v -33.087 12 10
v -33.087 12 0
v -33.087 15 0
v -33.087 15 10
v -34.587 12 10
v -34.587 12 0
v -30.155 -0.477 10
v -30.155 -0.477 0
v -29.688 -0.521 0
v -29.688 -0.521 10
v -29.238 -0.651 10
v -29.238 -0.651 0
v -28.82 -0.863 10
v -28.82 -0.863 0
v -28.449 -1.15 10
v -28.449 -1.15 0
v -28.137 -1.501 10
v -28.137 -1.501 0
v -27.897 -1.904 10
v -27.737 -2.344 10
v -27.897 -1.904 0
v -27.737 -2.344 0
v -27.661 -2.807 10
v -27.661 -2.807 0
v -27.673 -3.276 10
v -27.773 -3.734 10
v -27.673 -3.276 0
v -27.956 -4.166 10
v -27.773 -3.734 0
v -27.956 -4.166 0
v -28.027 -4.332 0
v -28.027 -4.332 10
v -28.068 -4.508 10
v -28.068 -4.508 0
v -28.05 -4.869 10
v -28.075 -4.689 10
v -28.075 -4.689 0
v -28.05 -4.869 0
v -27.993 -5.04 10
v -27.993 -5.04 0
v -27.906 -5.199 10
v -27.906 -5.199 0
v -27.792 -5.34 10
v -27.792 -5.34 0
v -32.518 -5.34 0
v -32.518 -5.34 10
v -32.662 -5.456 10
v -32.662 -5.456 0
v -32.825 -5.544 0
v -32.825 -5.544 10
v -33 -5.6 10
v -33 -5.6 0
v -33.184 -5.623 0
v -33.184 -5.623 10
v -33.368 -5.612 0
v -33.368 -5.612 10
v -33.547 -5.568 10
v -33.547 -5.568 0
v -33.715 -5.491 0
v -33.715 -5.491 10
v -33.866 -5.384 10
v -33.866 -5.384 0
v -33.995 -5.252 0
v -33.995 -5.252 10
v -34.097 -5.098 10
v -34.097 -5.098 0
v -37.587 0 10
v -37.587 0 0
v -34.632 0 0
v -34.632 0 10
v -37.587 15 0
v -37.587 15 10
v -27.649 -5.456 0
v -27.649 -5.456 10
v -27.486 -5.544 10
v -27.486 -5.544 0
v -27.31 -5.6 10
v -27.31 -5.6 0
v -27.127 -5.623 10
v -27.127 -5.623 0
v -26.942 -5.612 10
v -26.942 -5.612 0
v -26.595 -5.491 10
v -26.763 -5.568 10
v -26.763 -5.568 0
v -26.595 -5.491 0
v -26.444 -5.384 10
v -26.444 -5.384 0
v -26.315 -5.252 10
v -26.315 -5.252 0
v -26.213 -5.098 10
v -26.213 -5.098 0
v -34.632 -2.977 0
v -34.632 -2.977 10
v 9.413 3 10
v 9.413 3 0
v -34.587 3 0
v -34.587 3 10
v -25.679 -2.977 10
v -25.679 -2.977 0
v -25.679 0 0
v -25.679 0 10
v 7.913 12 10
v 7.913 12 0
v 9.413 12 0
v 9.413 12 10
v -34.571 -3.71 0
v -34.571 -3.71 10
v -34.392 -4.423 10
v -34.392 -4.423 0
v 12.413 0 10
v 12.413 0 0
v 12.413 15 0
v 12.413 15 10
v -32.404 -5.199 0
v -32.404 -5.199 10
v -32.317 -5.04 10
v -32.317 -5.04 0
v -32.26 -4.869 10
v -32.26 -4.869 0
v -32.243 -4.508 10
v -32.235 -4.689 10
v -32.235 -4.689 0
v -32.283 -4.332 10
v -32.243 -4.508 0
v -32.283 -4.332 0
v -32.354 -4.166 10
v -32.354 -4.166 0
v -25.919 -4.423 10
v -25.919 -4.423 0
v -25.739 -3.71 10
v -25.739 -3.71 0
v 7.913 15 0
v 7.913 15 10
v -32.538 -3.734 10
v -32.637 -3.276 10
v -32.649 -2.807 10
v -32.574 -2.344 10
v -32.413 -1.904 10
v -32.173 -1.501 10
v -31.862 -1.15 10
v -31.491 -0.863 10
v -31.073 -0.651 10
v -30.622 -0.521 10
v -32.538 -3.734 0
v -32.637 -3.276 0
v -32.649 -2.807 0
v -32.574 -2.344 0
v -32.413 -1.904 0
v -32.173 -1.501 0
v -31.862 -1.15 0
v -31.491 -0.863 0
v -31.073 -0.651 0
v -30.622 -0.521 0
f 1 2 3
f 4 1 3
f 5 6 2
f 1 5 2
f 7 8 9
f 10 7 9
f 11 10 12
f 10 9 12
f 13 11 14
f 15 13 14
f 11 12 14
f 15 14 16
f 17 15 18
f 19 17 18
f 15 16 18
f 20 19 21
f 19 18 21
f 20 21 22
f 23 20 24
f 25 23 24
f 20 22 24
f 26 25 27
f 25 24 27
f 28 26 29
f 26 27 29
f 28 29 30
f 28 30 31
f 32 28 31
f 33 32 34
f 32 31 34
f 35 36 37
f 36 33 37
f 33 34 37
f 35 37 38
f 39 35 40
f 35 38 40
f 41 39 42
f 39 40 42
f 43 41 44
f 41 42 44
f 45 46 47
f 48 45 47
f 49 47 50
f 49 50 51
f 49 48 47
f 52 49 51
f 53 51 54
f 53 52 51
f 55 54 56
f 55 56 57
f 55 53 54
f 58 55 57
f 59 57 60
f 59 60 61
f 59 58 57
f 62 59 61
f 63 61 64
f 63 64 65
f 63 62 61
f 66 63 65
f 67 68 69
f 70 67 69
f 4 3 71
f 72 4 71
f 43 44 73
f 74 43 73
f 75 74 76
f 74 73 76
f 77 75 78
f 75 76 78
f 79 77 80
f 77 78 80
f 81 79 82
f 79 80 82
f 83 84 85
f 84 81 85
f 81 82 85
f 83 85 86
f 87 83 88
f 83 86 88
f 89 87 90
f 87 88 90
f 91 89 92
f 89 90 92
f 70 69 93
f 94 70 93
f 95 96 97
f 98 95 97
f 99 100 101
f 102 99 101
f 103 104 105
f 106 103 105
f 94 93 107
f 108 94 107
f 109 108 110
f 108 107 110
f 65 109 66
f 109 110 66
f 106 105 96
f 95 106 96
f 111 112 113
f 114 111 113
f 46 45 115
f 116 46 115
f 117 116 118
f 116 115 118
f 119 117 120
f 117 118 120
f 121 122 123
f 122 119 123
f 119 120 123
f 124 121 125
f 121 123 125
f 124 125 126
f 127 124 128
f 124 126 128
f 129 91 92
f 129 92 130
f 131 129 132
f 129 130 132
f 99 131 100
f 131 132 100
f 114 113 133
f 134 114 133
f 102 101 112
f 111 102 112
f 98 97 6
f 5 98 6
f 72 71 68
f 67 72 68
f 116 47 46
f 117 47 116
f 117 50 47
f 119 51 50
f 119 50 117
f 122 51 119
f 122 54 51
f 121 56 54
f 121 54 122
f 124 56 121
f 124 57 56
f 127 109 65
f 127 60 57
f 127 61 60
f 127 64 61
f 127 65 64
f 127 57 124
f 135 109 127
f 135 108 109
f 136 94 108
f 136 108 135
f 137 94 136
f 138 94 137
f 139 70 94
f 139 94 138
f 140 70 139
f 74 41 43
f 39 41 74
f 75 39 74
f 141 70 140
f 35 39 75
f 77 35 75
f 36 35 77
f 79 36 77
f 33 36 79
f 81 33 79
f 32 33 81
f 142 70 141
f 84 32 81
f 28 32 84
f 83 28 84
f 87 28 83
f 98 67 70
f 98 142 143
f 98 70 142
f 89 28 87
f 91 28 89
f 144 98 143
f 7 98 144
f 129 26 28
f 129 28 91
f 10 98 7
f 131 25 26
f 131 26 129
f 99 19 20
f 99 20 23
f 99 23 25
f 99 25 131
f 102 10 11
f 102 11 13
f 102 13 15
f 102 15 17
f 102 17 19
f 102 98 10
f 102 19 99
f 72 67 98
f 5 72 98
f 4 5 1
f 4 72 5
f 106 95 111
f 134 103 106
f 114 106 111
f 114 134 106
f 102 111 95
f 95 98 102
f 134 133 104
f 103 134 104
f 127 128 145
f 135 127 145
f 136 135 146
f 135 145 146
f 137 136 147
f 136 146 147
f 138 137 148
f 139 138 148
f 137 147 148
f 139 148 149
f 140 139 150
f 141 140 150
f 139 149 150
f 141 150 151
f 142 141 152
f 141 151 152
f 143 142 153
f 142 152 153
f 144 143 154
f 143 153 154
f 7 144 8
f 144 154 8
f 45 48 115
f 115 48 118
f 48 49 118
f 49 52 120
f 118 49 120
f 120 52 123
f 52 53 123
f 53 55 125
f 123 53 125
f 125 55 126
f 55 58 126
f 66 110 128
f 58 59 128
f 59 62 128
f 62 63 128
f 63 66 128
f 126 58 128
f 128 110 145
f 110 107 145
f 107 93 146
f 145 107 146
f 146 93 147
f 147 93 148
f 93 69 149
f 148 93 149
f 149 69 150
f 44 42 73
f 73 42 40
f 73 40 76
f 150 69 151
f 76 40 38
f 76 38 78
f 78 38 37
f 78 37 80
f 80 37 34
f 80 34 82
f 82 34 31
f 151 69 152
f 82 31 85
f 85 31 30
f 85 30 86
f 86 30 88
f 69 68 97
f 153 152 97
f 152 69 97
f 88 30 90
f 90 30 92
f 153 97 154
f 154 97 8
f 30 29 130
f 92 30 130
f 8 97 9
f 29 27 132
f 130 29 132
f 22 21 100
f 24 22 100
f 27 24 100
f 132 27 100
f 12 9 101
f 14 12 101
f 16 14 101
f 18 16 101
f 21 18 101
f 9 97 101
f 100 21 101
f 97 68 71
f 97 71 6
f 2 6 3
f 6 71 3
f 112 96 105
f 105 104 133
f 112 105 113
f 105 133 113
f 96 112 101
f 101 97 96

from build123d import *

# Parameters (mm, degrees)
F1_DEPTH    = 10
F2_T1_DEPTH = 16.5073043021
F2_T3_DEPTH = 14.2705098312


# Not quite as in the source:
# - a fillet or chamfer that OpenCascade refuses, or shapes differently, is made with other operations: its cross-section is extruded or revolved along the edge and cut away or added


with BuildPart() as f1:
    # F0 (on Top) → F1 (new body)
    with BuildSketch(Plane.XY):
        with BuildLine():
            Line((-25.6786430255, 0), (12.4131741374, 0))
            Line((12.4131741374, 0), (12.4131741374, 15))
            Line((12.4131741374, 15), (7.9131741374, 15))
            Line((7.9131741374, 15), (7.9131741374, 12))
            Line((7.9131741374, 12), (9.4131741374, 12))
            Line((9.4131741374, 12), (9.4131741374, 3))
            Line((9.4131741374, 3), (-34.5868258626, 3))
            Line((-34.5868258626, 3), (-34.5868258626, 12))
            Line((-34.5868258626, 12), (-33.0868258626, 12))
            Line((-33.0868258626, 12), (-33.0868258626, 15))
            Line((-33.0868258626, 15), (-37.5868258626, 15))
            Line((-37.5868258626, 15), (-37.5868258626, 0))
            Line((-37.5868258626, 0), (-34.6318436787, 0))
            Line((-34.6318436787, 0), (-34.6318436787, -2.9766003136))
            ThreePointArc((-34.6318436787, -2.9766003136), (-34.291082769, -4.6897210919), (-33.3206777997, -6.1420347612))
            Line((-33.3206777997, -6.1420347612), (-31.923010305, -4.7443672665))
            ThreePointArc((-31.923010305, -4.7443672665), (-32.4649421833, -2.0198917326), (-30.1552433521, -0.4766003136))
            ThreePointArc((-30.1552433521, -0.4766003136), (-27.8455445208, -2.0198917326), (-28.3874763991, -4.7443672665))
            Line((-28.3874763991, -4.7443672665), (-26.9898089045, -6.1420347612))
            ThreePointArc((-26.9898089045, -6.1420347612), (-26.0194039351, -4.6897210919), (-25.6786430255, -2.9766003136))
            Line((-25.6786430255, -2.9766003136), (-25.6786430255, 0))
        make_face()
    extrude(amount=F1_DEPTH)

    # F2: fillet of radius 1 on 4 edges, made by hand

    # F2_s2 → F2_t1 (cut)
    with BuildSketch(Plane.XY.offset(-3.253652151)):
        with BuildLine():
            ThreePointArc((-32.5096806342, -5.3310375957), (-33.3621500528, -5.6133092576), (-34.0974017442, -5.0977645446))
            ThreePointArc((-34.0974017442, -5.0977645446), (-33.7471918574, -5.6482770191), (-33.3206777997, -6.1420347612))
            Line((-33.3206777997, -6.1420347612), (-32.5096806342, -5.3310375957))
        make_face()
        with BuildLine():
            ThreePointArc((-27.8008060699, -5.3310375957), (-26.9483366513, -5.6133092576), (-26.2130849599, -5.0977645446))
            ThreePointArc((-26.2130849599, -5.0977645446), (-26.5632948467, -5.6482770191), (-26.9898089045, -6.1420347612))
            Line((-26.9898089045, -6.1420347612), (-27.8008060699, -5.3310375957))
        make_face()
    extrude(amount=F2_T1_DEPTH, mode=Mode.SUBTRACT)

    # F2_s4 → F2_t3 (cut)
    with BuildSketch(Plane.XY.offset(-2.1352549156)):
        with BuildLine():
            ThreePointArc((-32.5269515972, -5.3483085587), (-32.2445345415, -4.7855713596), (-32.3543969423, -4.1656013592))
            ThreePointArc((-32.3543969423, -4.1656013592), (-32.1597026664, -4.4706360752), (-31.923010305, -4.7443672665))
            Line((-31.923010305, -4.7443672665), (-32.5269515972, -5.3483085587))
        make_face()
        with BuildLine():
            ThreePointArc((-27.9560897618, -4.1656013592), (-28.0659521626, -4.7855713596), (-27.7835351069, -5.3483085587))
            Line((-27.7835351069, -5.3483085587), (-28.3874763991, -4.7443672665))
            ThreePointArc((-28.3874763991, -4.7443672665), (-28.1507840377, -4.4706360752), (-27.9560897618, -4.1656013592))
        make_face()
    extrude(amount=F2_T3_DEPTH, mode=Mode.SUBTRACT)


solid = f1.part
